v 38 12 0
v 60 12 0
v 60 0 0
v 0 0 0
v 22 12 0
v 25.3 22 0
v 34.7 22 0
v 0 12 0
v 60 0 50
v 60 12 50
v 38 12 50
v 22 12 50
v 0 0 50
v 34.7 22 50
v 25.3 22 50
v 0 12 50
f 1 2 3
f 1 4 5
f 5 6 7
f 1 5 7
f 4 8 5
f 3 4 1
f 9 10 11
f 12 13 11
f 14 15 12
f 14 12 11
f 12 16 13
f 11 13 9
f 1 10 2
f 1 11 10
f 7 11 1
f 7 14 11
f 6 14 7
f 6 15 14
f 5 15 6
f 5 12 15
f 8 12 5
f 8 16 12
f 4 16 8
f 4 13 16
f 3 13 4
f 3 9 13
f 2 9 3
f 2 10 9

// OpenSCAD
$fn = 32;

// ----------------------------------------------------------------------
// V guide rail: dovetail, 60 mm wide
// ----------------------------------------------------------------------

// --- parameters (mm) ---
rail_w = 60;              // rail width, X
base_t = 12;              // base plate thickness
v_depth = 10;             // V feature depth / height
v_half_w = 8;             // half width of the V at the base face
plate_t = 50;             // rail length, Z (the extrusion height)
top_half_w = 4.7;         // half width at the dovetail top

dovetail_base = 2 * v_half_w;  // dovetail width at the base
dovetail_top = 2 * top_half_w;  // dovetail width at the top

profile = [[0, 0], [60, 0], [60, 12], [38, 12], [34.7, 22], [25.3, 22], [22, 12], [0, 12]];  // primary outline, 8 points, counter clockwise

// --- the one profile operation ---
linear_extrude(height = plate_t) polygon(points = profile);
